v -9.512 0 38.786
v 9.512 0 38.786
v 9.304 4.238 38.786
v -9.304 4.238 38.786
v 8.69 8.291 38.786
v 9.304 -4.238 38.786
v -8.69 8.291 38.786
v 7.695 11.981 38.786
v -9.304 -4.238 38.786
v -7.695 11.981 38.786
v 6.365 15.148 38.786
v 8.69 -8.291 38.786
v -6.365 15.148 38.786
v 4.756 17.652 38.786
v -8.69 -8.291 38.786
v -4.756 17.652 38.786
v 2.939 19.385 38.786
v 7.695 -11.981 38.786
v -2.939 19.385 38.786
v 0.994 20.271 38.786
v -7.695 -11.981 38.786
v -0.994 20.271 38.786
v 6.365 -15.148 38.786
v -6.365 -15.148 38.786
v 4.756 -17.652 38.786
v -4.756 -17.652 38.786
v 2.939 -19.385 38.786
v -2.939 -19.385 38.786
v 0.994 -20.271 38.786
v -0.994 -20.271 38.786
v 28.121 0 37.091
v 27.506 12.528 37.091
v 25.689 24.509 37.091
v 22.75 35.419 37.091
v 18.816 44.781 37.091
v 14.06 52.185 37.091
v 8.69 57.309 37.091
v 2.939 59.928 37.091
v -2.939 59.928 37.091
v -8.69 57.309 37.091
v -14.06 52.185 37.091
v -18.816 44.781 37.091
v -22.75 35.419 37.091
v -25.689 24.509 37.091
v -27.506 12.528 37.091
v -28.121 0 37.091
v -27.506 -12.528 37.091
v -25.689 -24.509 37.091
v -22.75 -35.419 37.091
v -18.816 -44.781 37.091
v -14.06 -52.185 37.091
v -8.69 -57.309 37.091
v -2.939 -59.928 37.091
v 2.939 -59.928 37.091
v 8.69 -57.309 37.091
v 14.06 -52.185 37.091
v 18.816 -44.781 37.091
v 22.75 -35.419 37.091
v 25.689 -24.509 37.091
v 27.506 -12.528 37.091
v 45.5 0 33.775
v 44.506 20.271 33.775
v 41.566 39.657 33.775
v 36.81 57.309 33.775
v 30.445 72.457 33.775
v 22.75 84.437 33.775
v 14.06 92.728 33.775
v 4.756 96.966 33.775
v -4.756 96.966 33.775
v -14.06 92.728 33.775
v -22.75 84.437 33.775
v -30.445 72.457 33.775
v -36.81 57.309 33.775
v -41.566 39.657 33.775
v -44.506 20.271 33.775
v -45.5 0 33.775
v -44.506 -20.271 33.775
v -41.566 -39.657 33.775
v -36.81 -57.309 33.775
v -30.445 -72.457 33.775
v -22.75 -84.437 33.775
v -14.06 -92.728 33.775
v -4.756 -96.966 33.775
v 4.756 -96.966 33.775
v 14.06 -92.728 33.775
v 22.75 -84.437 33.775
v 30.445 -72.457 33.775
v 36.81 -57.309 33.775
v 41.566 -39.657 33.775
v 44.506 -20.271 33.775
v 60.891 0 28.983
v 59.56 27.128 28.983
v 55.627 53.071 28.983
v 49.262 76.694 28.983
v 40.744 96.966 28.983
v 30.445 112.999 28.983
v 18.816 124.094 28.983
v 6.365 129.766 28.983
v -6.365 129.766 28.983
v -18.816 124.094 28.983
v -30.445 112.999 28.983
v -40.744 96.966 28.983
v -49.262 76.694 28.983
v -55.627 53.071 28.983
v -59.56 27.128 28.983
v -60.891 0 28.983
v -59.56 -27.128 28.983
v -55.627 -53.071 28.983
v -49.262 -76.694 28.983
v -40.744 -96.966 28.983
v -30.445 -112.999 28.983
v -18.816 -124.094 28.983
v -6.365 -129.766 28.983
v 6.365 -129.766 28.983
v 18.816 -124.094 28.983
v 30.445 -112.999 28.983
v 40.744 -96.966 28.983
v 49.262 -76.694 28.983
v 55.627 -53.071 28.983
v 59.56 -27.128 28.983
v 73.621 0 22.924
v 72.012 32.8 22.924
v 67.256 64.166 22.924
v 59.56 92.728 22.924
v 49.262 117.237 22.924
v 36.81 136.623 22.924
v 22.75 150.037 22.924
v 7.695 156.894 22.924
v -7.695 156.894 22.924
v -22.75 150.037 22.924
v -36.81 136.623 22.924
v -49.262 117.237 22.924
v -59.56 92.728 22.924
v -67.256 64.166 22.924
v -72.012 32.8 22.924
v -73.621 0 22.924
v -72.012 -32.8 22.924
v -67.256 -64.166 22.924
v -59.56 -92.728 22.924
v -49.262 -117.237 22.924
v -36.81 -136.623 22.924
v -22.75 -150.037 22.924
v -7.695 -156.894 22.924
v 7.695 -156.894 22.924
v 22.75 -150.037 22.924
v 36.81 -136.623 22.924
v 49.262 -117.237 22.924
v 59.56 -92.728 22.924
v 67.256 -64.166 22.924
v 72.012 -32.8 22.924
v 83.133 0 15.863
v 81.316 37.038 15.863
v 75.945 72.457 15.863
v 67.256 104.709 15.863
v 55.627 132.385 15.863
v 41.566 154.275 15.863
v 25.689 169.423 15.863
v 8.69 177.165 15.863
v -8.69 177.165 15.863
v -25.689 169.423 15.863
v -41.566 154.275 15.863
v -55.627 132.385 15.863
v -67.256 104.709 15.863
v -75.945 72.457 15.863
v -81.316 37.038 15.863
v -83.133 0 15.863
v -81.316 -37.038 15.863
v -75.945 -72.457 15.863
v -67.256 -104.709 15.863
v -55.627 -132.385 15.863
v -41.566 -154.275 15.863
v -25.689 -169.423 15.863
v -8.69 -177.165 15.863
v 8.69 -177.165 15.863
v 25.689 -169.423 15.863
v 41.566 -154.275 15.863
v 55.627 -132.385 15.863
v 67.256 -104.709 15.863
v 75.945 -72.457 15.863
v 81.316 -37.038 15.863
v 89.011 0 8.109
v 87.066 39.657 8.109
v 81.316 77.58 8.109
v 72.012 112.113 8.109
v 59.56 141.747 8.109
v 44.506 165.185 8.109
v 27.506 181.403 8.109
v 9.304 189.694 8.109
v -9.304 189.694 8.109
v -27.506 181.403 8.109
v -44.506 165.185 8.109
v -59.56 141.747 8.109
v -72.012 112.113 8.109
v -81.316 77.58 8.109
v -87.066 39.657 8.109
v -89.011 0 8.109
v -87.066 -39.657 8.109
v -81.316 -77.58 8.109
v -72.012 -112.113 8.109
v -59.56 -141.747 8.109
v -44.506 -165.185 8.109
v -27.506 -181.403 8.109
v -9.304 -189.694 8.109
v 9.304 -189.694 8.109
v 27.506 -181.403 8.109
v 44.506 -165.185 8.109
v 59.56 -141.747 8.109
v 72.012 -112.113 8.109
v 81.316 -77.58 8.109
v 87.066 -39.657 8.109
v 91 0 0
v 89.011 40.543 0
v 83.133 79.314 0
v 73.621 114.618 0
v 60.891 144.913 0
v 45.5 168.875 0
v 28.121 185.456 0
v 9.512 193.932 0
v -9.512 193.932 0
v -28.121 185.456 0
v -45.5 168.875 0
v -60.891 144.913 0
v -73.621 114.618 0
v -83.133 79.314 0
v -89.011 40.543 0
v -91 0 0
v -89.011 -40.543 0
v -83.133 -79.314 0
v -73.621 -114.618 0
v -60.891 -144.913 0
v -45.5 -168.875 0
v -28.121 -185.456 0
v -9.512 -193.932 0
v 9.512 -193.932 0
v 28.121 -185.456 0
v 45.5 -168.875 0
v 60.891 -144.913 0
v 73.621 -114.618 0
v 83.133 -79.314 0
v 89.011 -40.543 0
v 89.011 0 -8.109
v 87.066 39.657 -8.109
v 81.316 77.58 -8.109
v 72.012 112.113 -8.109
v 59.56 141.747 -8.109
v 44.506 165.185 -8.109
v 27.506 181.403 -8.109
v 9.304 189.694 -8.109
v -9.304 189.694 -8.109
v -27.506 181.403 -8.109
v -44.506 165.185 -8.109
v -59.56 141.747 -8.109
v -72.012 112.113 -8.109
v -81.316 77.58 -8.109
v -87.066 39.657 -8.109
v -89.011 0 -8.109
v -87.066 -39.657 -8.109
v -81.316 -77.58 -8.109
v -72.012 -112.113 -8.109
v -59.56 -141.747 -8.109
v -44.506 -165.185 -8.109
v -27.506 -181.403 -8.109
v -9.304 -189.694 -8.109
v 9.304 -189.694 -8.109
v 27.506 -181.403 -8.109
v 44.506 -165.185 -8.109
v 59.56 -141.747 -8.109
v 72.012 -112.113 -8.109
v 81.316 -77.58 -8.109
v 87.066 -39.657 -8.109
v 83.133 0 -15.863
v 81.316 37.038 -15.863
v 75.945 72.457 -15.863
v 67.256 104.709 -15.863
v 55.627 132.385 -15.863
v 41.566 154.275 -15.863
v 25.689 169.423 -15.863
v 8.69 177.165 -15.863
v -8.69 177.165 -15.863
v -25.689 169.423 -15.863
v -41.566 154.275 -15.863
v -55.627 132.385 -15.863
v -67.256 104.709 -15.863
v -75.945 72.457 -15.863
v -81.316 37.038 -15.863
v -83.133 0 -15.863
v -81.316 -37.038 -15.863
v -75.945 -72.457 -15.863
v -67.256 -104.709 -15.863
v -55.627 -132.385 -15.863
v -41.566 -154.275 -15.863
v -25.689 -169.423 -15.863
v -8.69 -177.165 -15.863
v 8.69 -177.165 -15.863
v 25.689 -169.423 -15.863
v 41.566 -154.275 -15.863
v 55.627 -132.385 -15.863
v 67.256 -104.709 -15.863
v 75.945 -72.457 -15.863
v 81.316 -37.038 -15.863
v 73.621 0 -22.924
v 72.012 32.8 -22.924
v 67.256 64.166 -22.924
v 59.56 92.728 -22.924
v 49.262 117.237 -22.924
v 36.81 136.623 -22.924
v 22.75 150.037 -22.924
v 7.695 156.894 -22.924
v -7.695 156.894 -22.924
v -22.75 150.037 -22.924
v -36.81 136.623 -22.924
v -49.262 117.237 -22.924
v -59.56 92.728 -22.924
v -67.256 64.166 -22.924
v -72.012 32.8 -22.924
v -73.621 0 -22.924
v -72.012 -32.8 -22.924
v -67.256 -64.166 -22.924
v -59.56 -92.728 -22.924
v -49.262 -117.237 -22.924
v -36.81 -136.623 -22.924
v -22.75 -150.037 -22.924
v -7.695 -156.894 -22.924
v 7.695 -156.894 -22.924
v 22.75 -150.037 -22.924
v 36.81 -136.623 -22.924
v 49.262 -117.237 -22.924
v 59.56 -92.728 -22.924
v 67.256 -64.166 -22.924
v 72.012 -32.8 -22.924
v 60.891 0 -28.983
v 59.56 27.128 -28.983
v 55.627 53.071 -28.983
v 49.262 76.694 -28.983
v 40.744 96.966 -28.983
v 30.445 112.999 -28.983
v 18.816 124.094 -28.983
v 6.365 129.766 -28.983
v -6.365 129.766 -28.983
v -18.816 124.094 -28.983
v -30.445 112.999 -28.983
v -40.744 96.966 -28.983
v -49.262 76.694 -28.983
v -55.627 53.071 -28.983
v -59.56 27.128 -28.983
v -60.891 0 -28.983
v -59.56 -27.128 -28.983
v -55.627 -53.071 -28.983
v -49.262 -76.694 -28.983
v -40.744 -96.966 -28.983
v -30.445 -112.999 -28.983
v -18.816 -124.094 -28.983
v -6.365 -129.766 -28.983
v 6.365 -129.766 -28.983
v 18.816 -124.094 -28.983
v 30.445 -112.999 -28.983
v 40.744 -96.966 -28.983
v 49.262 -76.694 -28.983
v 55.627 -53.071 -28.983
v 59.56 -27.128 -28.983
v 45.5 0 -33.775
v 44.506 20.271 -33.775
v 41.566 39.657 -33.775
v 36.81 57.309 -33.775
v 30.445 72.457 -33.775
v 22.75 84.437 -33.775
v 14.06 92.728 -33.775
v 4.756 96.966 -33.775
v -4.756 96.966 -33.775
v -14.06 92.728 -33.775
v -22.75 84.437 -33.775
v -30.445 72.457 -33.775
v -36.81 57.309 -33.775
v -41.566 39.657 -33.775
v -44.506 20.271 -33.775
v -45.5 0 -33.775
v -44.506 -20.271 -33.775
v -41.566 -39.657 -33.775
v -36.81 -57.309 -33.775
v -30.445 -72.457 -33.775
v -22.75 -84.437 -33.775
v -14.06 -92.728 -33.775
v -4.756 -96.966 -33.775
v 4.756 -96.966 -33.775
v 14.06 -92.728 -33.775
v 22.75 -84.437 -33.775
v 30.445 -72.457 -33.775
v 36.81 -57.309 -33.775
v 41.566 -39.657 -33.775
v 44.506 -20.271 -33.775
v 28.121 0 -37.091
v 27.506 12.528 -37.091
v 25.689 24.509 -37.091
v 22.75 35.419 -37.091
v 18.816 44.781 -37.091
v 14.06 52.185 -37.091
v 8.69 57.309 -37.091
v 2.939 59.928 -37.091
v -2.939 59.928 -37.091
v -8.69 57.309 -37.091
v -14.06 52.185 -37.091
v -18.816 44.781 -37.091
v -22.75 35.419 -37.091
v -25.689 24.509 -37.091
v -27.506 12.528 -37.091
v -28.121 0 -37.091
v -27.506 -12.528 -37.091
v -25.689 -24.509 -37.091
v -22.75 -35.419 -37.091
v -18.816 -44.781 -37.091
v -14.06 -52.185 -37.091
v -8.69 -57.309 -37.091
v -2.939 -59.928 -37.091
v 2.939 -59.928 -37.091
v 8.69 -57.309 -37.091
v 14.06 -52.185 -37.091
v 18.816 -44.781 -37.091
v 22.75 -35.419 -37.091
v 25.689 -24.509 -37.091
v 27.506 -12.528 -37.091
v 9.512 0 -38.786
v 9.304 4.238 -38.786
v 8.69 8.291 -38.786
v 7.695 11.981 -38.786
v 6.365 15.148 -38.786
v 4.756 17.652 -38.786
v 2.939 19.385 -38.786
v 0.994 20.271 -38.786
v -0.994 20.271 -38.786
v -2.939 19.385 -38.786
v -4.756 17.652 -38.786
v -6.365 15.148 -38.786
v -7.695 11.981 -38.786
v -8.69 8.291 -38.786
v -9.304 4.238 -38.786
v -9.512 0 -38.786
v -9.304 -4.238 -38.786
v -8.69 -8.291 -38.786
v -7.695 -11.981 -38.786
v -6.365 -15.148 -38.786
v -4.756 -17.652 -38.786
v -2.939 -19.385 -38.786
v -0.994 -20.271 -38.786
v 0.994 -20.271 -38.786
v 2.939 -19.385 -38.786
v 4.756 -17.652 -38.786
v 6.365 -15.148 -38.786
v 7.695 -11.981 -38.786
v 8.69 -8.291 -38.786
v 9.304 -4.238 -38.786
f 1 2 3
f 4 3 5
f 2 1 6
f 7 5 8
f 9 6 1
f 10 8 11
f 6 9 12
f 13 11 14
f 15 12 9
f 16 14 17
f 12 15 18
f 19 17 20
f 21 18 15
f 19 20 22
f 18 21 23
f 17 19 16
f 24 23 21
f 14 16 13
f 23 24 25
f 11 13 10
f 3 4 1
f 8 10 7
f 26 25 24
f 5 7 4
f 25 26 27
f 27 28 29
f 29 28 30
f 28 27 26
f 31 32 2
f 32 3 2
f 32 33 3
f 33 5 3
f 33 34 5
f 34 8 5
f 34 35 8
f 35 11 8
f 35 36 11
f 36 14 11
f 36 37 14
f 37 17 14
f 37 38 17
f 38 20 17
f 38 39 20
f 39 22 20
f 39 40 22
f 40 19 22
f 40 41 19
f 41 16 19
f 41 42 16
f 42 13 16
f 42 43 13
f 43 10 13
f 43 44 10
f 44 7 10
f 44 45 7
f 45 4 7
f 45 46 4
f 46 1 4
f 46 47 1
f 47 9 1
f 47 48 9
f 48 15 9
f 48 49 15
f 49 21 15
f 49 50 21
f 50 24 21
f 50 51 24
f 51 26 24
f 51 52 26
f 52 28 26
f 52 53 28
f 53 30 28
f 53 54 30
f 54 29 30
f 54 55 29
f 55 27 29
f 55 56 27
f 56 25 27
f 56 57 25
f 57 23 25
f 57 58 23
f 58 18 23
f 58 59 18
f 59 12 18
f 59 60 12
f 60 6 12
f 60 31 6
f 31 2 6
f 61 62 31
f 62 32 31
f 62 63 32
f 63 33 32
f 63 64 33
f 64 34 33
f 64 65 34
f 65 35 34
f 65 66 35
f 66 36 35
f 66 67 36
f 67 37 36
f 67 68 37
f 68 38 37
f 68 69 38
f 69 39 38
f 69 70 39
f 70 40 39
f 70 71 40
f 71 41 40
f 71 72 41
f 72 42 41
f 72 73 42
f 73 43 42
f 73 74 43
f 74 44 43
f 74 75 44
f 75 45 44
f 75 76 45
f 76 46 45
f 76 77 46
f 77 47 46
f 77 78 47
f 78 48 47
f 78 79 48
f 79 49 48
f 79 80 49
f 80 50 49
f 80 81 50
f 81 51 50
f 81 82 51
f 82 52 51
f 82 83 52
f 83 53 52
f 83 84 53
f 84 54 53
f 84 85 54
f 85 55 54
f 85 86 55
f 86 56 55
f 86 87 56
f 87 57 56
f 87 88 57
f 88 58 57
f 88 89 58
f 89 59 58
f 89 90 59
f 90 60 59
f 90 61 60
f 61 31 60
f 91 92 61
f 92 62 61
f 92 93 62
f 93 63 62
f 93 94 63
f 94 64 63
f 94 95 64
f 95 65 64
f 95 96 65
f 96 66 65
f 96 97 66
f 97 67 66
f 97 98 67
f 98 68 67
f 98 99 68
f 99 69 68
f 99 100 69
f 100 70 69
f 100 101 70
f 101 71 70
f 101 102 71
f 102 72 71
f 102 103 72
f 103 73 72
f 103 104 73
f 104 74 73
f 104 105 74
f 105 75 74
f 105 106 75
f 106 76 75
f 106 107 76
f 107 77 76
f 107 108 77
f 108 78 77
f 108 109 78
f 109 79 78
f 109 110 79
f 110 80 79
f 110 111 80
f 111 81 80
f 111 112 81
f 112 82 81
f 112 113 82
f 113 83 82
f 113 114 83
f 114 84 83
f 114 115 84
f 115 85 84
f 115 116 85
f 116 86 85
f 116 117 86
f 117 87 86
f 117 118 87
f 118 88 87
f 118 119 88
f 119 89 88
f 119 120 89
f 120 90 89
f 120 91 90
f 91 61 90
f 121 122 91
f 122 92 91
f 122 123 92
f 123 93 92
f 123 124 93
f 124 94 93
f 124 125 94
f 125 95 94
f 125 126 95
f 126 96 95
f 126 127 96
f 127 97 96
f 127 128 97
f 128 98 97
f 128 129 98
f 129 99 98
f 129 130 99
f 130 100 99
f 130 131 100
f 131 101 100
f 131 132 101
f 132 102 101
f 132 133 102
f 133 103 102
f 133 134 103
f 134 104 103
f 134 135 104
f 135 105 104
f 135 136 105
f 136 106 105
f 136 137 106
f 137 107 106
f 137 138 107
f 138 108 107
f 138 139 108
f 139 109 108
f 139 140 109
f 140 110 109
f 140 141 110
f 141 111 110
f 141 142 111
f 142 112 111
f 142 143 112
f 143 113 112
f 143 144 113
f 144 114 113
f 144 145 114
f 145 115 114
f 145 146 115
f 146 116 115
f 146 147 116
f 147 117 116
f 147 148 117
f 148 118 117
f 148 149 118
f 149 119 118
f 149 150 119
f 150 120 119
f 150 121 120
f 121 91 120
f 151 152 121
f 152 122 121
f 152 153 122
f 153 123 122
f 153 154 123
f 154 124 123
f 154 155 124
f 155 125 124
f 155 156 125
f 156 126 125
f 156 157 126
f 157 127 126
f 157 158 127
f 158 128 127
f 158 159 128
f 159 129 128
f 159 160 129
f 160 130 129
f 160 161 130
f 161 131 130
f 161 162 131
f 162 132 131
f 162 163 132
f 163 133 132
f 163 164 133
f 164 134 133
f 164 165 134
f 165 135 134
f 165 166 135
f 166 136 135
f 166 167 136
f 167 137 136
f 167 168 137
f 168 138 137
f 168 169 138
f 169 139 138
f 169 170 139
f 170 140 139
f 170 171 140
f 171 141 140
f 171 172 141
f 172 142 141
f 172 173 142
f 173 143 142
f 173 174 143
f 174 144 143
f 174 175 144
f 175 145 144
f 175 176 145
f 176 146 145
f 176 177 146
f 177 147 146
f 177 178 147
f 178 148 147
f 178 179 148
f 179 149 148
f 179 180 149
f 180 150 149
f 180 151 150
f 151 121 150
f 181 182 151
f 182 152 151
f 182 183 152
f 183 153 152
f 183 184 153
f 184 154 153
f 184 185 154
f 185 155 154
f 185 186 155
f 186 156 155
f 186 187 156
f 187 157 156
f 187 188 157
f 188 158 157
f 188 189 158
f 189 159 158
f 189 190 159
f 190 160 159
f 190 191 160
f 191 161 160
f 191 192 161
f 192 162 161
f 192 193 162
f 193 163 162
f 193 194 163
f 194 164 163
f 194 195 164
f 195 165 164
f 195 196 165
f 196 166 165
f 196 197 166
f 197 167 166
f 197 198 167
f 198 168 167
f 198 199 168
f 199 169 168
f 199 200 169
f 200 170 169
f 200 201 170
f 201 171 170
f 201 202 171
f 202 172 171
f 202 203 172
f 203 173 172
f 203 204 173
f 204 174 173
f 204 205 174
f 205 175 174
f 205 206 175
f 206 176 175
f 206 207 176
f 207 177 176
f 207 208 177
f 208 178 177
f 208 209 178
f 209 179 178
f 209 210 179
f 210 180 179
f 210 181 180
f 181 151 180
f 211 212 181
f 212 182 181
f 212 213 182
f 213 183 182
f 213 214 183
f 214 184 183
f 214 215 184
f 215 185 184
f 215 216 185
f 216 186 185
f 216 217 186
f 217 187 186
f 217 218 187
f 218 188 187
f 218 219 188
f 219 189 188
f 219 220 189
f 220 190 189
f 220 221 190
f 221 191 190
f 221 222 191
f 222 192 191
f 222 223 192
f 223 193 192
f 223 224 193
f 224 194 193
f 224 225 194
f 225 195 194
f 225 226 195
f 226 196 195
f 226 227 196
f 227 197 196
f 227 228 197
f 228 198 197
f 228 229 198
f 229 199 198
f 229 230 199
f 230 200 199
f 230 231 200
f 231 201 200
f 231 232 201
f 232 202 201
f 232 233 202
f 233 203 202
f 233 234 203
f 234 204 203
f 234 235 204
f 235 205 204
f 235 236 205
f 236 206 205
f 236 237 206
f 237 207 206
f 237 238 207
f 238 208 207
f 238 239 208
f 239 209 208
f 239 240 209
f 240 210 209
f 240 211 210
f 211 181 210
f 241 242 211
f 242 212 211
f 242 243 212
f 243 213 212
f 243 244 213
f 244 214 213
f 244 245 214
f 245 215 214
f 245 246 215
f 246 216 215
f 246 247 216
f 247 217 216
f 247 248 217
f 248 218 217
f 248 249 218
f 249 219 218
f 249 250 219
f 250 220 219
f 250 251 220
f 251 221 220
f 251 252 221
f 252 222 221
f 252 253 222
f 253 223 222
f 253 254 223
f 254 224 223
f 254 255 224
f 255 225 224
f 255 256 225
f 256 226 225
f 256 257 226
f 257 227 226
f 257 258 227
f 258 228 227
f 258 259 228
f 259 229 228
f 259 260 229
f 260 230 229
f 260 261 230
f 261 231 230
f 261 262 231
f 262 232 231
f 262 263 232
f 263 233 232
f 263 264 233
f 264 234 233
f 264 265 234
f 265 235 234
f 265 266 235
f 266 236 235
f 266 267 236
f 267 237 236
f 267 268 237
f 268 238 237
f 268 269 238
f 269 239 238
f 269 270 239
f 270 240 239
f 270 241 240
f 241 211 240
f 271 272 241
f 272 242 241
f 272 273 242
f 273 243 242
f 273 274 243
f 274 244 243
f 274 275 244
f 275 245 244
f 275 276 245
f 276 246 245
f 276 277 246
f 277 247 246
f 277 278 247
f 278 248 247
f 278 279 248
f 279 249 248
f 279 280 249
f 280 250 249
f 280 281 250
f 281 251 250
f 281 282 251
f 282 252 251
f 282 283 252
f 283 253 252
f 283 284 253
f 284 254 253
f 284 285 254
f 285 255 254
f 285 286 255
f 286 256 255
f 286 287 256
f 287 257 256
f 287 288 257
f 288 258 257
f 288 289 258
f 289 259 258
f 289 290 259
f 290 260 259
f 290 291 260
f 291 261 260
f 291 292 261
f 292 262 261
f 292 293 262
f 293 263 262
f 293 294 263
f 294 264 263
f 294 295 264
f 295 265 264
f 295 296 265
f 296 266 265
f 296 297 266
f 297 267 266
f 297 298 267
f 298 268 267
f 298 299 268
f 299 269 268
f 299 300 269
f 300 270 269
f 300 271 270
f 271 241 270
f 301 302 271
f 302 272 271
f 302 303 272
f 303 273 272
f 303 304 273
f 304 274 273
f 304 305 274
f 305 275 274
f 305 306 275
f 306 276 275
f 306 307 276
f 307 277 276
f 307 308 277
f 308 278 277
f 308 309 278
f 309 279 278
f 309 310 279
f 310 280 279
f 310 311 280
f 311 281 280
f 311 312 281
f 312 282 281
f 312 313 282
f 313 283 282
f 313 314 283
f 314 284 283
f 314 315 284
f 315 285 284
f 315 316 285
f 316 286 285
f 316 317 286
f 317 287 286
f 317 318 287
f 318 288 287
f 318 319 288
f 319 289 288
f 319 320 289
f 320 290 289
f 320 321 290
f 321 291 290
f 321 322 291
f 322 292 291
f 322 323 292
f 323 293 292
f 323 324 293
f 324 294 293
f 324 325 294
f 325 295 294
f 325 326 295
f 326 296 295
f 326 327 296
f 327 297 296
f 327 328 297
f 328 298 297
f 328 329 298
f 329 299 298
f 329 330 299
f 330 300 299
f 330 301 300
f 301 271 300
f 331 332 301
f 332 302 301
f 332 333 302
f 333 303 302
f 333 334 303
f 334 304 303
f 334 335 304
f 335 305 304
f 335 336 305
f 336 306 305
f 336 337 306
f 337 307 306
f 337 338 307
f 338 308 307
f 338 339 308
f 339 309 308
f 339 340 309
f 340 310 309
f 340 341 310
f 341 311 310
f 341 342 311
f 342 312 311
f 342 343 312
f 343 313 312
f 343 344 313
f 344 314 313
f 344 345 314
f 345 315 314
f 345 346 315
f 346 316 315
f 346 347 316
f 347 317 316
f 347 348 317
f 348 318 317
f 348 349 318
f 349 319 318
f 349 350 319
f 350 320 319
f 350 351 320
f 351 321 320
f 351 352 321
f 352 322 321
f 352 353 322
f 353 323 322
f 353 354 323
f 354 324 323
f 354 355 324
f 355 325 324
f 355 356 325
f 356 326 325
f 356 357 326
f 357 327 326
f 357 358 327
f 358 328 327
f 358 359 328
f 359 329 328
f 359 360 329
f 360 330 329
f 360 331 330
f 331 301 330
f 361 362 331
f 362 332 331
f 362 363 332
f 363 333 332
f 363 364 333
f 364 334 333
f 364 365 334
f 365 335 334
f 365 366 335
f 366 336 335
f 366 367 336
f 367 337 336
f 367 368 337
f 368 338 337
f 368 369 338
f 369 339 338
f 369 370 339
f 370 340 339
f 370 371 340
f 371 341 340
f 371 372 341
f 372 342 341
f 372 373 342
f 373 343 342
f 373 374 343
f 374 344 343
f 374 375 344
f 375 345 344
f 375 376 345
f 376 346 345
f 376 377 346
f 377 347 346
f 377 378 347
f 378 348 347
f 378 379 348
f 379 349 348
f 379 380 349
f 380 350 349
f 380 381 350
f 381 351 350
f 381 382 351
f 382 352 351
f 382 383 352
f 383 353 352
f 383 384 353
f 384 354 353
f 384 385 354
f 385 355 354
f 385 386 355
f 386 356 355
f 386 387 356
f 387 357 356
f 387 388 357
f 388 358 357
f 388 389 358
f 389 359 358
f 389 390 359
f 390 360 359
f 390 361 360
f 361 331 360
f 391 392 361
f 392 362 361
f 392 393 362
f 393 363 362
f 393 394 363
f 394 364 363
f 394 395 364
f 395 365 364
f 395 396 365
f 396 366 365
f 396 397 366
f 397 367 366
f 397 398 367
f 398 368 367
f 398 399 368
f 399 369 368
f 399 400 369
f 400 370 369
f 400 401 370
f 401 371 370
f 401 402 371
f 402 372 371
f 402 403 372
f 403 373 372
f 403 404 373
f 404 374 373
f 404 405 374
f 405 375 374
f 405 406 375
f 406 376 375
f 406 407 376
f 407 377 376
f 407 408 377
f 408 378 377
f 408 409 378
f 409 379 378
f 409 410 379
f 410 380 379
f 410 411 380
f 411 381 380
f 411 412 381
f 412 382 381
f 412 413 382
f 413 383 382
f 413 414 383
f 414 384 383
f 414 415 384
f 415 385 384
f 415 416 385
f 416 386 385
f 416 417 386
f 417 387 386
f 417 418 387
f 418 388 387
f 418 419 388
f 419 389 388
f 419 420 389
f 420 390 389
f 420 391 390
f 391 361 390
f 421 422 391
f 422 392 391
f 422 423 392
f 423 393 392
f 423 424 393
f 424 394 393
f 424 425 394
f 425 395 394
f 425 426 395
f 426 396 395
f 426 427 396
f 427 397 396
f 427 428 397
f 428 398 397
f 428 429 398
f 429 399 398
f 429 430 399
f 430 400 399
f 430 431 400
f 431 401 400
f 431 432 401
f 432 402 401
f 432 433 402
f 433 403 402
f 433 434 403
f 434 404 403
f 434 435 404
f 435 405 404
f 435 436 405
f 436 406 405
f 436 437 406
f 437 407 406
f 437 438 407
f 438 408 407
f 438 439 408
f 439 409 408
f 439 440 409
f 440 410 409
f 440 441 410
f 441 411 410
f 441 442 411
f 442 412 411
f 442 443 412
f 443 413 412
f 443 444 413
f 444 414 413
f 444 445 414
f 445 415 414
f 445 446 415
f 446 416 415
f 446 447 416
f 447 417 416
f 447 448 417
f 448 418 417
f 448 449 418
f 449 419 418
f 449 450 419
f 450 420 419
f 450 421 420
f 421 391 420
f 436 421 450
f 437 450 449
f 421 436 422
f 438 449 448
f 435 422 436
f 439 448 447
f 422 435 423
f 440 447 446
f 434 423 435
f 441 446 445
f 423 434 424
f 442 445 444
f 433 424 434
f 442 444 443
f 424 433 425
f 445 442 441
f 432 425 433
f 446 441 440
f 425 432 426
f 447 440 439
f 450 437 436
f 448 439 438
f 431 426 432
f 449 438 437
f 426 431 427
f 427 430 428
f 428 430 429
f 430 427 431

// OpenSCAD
// Generated by SolidPython 1.0.1 on 2020-07-29 00:46:48


scale(v = [7, 15, 3]) {
	sphere(r = 13);
}
/***********************************************
*********      SolidPython code:      **********
************************************************
 
# import packages: SolidPython
from solid import *
from solid.utils import *
from itertools import chain, combinations, permutations


class Resize:

    def __init__(self, scad_file):
        self.scad_file = scad_file
        #self.scad_file = import_scad(scad_file)
        # cone/cylinder param:
        self.r1 = 0
        self.r2 = 0
        self.h = 0
        # rectangular prism param:
        self.w = 0
        self.l = 0
        # ellipse param:
        self.r = 0

    # import OpenScad code (file name corresponds to shape)


    # classify shape + parameters
    def assign(self, param1, param2, param3):
        if self.scad_file == 'cone.scad':
            self.r1 = param1
            self.r2 = param2
            self.h = param3
        elif self.scad_file == 'cylinder.scad':
            self.r1 = param1
            self.r2 = param2
            self.h = param3
        elif self.scad_file == 'rectangularPrism.scad':
            self.h = param1
            self.l = param2
            self.w = param3
        else:
            self.r = param1
            self.h = param2

    # resize parameters
    def iterate(self):
        x = range(3, 20, 2)
        i = 1
        if self.scad_file == 'cone.scad':
            tempList = list(permutations(x, 2))
            for temp in tempList:
                param1 = temp[0]
                param2 = temp[1]
                filepath = 'produced_scad_files/' + 'cone' + str(param1) + '_' + str(param2) + '_' + '.scad'
                scad_render_to_file(cylinder(h=param1, r1=param2, r2=0), filepath)

        elif self.scad_file == 'cylinder.scad':
            tempList = list(permutations(x, 3))
            for temp in tempList:
                param1 = temp[0]
                param2 = temp[1]
                filepath = 'produced_scad_files/' + 'cylinder' + str(param1) + '_' + str(param2) + '_' + '.scad'
                scad_render_to_file(cylinder(h=param1, r1=param2, r2=param2), filepath)

        elif self.scad_file == 'rectangularPrism.scad':
            tempList = list(permutations(x, 3))
            for temp in tempList:
                param1 = temp[0]
                param2 = temp[1]
                param3 = temp[2]
                filepath = 'produced_scad_files/' + 'rectangularPrism' + str(param1) + '_' + str(param2) + '_' + str(
                    param3) + '.scad'
                scad_render_to_file(cube(size=(param1, param2, param3)), filepath)

        elif self.scad_file == 'ellipse.scad':
            tempList = list(permutations(x, 4))
            for temp in tempList:
                param1 = temp[0]
                param2 = temp[1]
                param3 = temp[2]
                param4 = temp[3]
                filepath = 'produced_scad_files/' + 'ellipse' + str(param1) + '_' + str(param2) + '_' + str(param3) + '_' + str(param4) + '.scad'
                scad_render_to_file(scale([param1, param2, param3])(sphere(r=param4)), filepath)

    def render_to_scadfile(self):
        scad_render_to_file(scad, 'example.scad') 
 
************************************************/
